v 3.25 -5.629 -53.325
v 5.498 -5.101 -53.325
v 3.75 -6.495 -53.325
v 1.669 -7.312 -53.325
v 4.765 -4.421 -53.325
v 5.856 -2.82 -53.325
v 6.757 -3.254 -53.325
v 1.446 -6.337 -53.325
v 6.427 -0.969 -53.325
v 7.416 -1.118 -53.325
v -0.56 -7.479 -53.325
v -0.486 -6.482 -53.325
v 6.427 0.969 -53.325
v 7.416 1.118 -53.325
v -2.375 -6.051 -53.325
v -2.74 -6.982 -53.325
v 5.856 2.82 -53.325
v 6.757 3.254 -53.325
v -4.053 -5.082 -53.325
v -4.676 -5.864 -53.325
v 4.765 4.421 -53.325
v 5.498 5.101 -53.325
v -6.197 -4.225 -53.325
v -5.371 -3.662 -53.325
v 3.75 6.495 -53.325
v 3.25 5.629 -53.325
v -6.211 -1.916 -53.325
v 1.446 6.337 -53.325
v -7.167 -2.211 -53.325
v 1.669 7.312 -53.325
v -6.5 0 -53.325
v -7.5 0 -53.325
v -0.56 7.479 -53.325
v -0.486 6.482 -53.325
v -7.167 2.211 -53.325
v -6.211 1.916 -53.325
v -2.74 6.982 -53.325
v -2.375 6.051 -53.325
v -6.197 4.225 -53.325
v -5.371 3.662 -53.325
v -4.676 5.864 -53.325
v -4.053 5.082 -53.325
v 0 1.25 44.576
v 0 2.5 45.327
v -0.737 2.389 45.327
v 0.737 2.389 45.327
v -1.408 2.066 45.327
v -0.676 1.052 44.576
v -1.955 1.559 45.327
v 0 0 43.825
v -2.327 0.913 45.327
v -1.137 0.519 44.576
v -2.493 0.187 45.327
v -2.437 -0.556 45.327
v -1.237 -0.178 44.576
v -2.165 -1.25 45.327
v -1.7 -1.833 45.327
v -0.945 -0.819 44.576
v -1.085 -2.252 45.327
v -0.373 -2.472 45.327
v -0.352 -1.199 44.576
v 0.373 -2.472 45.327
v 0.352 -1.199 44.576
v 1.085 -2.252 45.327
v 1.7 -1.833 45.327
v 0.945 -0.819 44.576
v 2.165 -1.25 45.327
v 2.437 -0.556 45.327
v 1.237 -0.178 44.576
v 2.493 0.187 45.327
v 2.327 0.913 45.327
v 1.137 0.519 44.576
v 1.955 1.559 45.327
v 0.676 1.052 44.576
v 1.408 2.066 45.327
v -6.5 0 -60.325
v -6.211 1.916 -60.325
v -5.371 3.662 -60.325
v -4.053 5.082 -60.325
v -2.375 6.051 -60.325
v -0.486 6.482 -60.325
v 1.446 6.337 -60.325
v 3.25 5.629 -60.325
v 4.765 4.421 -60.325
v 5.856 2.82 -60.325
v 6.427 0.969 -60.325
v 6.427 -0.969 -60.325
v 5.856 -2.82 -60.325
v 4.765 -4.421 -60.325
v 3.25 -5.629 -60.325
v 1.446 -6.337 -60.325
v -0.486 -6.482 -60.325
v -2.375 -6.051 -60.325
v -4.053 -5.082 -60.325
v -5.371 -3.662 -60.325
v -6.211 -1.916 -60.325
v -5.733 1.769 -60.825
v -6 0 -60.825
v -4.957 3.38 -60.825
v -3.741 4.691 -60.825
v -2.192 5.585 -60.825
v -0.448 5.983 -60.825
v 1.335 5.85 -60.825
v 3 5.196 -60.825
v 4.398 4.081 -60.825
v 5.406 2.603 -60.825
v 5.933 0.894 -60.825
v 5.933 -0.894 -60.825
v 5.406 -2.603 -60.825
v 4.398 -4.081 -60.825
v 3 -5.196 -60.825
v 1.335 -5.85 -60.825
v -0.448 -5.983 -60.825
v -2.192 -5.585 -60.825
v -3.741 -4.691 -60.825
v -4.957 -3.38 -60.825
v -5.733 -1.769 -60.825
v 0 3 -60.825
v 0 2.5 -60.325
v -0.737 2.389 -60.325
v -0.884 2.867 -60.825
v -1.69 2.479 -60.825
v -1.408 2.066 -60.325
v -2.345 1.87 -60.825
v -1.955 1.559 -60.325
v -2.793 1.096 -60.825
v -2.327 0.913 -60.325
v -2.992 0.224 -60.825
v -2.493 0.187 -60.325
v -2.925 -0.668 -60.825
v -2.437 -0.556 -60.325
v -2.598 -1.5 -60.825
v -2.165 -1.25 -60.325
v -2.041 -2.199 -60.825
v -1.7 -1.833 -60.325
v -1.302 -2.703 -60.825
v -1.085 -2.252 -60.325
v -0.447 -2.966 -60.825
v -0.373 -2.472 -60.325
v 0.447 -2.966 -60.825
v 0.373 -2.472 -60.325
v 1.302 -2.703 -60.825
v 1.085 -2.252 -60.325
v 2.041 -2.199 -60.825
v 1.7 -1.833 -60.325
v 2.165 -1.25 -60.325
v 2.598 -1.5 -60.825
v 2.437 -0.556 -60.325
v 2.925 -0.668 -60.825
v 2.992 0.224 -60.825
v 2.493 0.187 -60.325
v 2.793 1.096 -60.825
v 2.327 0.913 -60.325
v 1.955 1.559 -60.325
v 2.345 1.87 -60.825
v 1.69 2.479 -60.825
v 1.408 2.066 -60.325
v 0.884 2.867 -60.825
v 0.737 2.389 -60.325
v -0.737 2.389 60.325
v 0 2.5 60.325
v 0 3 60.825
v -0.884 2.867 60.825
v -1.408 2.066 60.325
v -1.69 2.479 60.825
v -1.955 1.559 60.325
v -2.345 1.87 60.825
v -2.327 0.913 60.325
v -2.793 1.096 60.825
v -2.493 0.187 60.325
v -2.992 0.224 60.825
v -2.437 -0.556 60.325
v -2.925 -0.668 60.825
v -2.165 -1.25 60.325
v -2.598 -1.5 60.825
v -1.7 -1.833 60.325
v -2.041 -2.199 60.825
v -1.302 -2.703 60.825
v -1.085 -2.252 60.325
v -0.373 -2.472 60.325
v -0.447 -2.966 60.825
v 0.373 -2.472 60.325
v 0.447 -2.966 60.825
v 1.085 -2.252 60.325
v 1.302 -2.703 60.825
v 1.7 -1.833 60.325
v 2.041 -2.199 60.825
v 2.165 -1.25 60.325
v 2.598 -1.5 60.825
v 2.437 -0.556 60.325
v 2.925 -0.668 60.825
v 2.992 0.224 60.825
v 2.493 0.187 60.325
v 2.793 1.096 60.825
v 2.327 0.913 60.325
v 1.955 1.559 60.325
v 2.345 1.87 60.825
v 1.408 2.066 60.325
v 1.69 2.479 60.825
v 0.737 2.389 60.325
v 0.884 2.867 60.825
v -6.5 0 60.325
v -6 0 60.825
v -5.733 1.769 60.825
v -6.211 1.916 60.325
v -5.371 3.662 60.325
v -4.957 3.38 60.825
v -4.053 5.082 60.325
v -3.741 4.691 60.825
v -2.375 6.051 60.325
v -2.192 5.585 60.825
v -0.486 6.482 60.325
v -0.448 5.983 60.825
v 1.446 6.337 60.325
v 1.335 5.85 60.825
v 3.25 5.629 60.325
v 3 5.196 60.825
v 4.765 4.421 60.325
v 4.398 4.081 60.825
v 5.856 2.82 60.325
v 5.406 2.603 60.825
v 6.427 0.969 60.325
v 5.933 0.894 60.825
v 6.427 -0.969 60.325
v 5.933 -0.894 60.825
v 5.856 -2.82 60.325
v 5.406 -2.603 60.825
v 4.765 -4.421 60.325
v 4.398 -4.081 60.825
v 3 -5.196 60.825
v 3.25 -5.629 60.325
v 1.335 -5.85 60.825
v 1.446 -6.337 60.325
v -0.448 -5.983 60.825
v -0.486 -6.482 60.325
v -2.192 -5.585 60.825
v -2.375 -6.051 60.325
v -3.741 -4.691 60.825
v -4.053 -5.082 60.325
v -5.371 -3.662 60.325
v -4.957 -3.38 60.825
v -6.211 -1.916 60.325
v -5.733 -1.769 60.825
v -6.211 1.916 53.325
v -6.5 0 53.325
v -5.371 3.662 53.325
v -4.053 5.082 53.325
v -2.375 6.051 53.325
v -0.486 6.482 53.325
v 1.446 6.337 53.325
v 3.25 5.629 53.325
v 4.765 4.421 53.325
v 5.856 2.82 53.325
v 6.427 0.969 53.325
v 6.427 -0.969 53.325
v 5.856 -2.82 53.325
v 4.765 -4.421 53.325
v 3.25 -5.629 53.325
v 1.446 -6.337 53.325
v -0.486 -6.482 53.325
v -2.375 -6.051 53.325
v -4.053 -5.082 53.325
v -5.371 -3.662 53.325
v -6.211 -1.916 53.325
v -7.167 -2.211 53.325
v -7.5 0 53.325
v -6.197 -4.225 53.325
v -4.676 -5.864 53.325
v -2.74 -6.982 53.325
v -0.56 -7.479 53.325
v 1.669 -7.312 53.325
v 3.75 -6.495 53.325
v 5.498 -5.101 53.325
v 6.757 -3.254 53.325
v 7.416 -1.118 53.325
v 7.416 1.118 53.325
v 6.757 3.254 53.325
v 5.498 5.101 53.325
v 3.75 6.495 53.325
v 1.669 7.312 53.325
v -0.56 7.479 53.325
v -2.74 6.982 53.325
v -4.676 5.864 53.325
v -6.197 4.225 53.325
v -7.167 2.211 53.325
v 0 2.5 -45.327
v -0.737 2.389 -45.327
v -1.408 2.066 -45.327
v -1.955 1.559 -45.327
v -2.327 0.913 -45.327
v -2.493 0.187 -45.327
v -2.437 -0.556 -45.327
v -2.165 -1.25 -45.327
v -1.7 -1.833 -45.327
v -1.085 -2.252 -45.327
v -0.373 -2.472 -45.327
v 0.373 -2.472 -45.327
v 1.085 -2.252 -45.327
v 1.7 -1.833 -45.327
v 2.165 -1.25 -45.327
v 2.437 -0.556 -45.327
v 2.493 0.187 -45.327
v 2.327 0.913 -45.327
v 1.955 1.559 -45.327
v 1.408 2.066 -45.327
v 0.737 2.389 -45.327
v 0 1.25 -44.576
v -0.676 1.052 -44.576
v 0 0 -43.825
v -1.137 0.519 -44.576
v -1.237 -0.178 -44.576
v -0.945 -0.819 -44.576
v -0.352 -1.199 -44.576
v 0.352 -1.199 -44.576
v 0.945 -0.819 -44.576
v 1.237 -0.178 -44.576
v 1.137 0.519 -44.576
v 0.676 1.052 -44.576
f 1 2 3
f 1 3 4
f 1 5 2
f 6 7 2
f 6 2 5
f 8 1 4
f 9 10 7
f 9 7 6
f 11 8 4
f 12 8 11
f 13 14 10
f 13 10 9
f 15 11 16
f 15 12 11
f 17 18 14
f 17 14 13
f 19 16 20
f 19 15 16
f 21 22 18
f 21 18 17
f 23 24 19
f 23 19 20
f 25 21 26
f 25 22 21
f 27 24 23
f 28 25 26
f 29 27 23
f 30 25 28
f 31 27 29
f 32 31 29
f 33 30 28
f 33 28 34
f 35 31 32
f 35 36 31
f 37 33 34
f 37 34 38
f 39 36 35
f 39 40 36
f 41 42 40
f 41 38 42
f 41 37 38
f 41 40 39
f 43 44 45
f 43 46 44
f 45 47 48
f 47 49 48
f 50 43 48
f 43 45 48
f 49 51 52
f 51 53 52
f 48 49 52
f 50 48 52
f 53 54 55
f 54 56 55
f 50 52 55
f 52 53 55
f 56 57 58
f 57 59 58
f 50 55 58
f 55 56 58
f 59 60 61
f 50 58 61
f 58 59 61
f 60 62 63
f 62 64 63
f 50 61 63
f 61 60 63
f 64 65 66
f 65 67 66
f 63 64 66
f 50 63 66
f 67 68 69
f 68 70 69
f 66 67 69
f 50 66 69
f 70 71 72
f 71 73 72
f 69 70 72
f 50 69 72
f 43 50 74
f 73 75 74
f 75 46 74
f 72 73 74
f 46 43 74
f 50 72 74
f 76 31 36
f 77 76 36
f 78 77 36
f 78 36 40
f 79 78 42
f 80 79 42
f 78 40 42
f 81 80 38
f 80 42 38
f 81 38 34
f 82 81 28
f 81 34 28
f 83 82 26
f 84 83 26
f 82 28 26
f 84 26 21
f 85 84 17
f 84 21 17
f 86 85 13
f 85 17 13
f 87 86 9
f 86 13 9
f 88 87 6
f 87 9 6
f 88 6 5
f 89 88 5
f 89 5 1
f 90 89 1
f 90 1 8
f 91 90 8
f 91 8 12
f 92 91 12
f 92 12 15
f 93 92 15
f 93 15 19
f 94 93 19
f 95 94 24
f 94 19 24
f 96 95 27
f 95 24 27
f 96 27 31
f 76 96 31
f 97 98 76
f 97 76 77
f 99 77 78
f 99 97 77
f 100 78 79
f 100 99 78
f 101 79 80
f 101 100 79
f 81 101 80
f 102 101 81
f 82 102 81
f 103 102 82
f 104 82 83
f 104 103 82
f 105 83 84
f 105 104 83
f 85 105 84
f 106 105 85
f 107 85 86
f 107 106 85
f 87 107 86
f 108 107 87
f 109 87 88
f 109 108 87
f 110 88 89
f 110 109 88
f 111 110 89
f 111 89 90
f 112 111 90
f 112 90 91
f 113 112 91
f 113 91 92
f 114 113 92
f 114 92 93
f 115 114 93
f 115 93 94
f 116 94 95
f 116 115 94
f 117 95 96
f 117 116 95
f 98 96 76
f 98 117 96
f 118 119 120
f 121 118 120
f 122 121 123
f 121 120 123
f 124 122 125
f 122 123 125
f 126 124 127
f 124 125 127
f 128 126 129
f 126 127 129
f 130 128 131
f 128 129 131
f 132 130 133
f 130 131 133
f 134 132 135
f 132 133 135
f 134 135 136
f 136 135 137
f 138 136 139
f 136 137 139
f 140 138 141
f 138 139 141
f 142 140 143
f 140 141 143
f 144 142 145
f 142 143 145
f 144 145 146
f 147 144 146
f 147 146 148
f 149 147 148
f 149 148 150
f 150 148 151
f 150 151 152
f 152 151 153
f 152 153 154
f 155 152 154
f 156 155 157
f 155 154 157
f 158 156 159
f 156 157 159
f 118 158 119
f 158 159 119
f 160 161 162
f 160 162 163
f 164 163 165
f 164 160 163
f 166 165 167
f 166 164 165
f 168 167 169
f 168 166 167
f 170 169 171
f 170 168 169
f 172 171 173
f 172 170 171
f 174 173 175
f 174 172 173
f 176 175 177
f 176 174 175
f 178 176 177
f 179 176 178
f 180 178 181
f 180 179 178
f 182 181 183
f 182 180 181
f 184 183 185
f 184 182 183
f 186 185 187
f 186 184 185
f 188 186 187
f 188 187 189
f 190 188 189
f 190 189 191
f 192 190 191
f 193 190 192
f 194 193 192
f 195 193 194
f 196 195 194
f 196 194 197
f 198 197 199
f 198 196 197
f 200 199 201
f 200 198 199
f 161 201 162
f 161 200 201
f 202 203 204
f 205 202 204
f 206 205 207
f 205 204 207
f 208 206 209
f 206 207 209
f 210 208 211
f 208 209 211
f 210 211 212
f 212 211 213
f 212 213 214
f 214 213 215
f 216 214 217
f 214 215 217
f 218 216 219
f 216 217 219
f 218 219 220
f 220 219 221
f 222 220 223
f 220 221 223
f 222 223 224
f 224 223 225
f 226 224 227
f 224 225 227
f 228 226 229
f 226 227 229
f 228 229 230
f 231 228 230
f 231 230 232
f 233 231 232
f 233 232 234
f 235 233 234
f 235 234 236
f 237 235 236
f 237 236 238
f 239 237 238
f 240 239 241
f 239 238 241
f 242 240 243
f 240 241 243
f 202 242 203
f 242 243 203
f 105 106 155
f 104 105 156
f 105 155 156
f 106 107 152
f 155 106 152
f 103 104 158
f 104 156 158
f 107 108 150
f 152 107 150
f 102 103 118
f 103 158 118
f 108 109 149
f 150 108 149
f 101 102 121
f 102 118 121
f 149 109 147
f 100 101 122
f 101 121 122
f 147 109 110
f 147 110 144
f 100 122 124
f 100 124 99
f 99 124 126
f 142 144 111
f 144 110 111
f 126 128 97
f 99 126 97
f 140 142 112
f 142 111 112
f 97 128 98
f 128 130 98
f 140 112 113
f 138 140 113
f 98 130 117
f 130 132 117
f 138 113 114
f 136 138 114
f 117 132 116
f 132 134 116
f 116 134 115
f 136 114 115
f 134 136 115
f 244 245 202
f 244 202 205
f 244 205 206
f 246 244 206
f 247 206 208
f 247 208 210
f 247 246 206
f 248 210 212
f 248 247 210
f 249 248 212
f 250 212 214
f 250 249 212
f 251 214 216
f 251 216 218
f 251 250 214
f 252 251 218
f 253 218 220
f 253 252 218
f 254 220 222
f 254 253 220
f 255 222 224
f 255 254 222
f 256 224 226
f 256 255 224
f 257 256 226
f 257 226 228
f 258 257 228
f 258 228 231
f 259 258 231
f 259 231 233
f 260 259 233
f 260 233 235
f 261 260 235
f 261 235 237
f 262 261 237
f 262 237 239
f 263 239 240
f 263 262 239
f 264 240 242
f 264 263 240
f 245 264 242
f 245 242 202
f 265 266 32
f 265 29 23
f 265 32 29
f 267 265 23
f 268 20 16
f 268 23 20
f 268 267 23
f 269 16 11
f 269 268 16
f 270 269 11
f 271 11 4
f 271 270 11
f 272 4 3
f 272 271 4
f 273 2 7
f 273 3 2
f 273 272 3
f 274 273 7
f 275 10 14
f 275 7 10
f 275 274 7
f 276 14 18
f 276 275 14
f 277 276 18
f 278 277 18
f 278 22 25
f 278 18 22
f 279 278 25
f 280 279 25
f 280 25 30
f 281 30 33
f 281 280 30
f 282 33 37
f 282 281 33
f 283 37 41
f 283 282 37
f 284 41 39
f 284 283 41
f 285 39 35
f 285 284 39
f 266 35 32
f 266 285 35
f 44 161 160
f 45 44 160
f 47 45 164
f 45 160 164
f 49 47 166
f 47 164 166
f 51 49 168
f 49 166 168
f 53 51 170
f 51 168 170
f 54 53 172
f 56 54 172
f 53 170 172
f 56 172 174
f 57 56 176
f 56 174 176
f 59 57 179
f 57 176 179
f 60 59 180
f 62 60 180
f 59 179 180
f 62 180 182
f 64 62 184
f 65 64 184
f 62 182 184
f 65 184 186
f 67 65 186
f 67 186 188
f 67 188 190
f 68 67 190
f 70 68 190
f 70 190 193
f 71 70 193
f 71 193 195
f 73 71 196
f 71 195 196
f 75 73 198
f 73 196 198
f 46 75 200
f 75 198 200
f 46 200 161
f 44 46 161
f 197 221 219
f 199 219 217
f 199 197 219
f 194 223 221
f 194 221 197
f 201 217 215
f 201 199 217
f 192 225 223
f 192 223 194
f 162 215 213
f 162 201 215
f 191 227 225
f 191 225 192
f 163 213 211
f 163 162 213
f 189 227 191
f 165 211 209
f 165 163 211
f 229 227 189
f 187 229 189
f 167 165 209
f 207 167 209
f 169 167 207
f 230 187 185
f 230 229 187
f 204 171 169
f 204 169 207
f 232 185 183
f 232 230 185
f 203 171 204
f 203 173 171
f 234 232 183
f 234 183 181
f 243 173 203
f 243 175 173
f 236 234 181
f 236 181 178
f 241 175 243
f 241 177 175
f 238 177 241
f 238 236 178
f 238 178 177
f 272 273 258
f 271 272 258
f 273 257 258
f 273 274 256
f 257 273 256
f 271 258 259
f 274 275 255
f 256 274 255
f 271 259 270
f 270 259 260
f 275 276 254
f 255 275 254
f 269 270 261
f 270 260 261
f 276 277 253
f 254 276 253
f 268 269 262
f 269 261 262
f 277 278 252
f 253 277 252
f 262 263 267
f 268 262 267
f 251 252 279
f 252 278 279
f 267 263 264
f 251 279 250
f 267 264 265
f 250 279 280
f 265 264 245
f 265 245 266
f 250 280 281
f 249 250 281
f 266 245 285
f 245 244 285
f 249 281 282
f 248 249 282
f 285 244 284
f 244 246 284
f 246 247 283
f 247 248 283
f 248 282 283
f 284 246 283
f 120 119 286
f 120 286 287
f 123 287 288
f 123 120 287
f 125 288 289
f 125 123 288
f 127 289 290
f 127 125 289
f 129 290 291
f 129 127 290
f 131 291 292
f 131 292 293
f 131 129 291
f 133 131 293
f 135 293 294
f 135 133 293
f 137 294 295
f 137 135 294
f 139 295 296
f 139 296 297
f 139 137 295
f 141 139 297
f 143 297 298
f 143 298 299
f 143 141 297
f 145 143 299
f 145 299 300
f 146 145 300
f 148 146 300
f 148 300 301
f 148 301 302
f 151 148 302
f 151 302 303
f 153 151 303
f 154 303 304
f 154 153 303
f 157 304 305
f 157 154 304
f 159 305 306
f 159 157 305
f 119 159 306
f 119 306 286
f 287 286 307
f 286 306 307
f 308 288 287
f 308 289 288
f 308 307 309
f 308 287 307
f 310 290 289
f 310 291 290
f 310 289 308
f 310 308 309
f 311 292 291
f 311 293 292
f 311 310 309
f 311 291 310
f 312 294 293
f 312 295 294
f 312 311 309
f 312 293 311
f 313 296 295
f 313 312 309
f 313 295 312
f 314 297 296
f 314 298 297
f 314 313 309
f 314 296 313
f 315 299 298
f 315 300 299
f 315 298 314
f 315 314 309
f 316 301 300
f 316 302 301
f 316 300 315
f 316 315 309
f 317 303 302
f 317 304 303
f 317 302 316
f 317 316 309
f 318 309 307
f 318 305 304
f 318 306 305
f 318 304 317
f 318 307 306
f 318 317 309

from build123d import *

# Parameters (mm, degrees)
ESBO_O1_R                = 7.5
RESSALTO_EXTRUS_O1_DEPTH = 60.825
CORTE_EXTRUS_O1_START    = -7.5
ESBO_O2_R                = 7.5
ESBO_O2_R_2              = 6.5
CORTE_EXTRUS_O1_DEPTH    = 7.5
CHANFRO1_SIZE            = 0.5


with BuildPart() as part:
    # Esboço1 → Ressalto-extrusão1 (new, symmetric)
    with BuildSketch(Plane.XY):
        with Locations(Location((0, 0, 0), (0, 0, 180))):
            Circle(ESBO_O1_R)
    extrude(amount=RESSALTO_EXTRUS_O1_DEPTH, both=True)

    # Esboço2 → Corte-extrusão1 (cut)
    with BuildSketch(Plane(origin=(0, 0, -60.825), x_dir=(-1, 0, 0), z_dir=(0, 0, -1)).offset(CORTE_EXTRUS_O1_START)):
        Circle(ESBO_O2_R)
        Circle(ESBO_O2_R_2, mode=Mode.SUBTRACT)
    corte_extrus_o1 = extrude(amount=CORTE_EXTRUS_O1_DEPTH, mode=Mode.SUBTRACT)

    # Esboço7 → Furo roscado de M6x1.01 (revolve, cut)
    with BuildSketch(Plane(origin=(0, 0, -60.825), x_dir=(0, 1, 0), z_dir=(1, 0, 0))):
        Polygon((0, 0), (0, 17), (2.5, 15.497848452), (2.5, 0), align=None)
    furo_roscado_de_m6x1_01 = revolve(axis=Axis((0, 0, -67.175), (0, 0, 1)), mode=Mode.SUBTRACT)

    # Espelhar1: Corte-extrusão1, Furo roscado de M6x1.01 across plane
    add(corte_extrus_o1.mirror(Plane.XY), mode=Mode.SUBTRACT)
    add(furo_roscado_de_m6x1_01.mirror(Plane.XY), mode=Mode.SUBTRACT)

    # Chanfro1
    chanfro1_edges = [part.edges().sort_by_distance(p)[0] for p in [
        (0, -2.5, -60.825),
        (6.5, 0, 60.825),
        (0, -2.5, 60.825),
        (6.5, 0, -60.825),
    ]]
    chamfer(chanfro1_edges, length=CHANFRO1_SIZE)


solid = part.part
